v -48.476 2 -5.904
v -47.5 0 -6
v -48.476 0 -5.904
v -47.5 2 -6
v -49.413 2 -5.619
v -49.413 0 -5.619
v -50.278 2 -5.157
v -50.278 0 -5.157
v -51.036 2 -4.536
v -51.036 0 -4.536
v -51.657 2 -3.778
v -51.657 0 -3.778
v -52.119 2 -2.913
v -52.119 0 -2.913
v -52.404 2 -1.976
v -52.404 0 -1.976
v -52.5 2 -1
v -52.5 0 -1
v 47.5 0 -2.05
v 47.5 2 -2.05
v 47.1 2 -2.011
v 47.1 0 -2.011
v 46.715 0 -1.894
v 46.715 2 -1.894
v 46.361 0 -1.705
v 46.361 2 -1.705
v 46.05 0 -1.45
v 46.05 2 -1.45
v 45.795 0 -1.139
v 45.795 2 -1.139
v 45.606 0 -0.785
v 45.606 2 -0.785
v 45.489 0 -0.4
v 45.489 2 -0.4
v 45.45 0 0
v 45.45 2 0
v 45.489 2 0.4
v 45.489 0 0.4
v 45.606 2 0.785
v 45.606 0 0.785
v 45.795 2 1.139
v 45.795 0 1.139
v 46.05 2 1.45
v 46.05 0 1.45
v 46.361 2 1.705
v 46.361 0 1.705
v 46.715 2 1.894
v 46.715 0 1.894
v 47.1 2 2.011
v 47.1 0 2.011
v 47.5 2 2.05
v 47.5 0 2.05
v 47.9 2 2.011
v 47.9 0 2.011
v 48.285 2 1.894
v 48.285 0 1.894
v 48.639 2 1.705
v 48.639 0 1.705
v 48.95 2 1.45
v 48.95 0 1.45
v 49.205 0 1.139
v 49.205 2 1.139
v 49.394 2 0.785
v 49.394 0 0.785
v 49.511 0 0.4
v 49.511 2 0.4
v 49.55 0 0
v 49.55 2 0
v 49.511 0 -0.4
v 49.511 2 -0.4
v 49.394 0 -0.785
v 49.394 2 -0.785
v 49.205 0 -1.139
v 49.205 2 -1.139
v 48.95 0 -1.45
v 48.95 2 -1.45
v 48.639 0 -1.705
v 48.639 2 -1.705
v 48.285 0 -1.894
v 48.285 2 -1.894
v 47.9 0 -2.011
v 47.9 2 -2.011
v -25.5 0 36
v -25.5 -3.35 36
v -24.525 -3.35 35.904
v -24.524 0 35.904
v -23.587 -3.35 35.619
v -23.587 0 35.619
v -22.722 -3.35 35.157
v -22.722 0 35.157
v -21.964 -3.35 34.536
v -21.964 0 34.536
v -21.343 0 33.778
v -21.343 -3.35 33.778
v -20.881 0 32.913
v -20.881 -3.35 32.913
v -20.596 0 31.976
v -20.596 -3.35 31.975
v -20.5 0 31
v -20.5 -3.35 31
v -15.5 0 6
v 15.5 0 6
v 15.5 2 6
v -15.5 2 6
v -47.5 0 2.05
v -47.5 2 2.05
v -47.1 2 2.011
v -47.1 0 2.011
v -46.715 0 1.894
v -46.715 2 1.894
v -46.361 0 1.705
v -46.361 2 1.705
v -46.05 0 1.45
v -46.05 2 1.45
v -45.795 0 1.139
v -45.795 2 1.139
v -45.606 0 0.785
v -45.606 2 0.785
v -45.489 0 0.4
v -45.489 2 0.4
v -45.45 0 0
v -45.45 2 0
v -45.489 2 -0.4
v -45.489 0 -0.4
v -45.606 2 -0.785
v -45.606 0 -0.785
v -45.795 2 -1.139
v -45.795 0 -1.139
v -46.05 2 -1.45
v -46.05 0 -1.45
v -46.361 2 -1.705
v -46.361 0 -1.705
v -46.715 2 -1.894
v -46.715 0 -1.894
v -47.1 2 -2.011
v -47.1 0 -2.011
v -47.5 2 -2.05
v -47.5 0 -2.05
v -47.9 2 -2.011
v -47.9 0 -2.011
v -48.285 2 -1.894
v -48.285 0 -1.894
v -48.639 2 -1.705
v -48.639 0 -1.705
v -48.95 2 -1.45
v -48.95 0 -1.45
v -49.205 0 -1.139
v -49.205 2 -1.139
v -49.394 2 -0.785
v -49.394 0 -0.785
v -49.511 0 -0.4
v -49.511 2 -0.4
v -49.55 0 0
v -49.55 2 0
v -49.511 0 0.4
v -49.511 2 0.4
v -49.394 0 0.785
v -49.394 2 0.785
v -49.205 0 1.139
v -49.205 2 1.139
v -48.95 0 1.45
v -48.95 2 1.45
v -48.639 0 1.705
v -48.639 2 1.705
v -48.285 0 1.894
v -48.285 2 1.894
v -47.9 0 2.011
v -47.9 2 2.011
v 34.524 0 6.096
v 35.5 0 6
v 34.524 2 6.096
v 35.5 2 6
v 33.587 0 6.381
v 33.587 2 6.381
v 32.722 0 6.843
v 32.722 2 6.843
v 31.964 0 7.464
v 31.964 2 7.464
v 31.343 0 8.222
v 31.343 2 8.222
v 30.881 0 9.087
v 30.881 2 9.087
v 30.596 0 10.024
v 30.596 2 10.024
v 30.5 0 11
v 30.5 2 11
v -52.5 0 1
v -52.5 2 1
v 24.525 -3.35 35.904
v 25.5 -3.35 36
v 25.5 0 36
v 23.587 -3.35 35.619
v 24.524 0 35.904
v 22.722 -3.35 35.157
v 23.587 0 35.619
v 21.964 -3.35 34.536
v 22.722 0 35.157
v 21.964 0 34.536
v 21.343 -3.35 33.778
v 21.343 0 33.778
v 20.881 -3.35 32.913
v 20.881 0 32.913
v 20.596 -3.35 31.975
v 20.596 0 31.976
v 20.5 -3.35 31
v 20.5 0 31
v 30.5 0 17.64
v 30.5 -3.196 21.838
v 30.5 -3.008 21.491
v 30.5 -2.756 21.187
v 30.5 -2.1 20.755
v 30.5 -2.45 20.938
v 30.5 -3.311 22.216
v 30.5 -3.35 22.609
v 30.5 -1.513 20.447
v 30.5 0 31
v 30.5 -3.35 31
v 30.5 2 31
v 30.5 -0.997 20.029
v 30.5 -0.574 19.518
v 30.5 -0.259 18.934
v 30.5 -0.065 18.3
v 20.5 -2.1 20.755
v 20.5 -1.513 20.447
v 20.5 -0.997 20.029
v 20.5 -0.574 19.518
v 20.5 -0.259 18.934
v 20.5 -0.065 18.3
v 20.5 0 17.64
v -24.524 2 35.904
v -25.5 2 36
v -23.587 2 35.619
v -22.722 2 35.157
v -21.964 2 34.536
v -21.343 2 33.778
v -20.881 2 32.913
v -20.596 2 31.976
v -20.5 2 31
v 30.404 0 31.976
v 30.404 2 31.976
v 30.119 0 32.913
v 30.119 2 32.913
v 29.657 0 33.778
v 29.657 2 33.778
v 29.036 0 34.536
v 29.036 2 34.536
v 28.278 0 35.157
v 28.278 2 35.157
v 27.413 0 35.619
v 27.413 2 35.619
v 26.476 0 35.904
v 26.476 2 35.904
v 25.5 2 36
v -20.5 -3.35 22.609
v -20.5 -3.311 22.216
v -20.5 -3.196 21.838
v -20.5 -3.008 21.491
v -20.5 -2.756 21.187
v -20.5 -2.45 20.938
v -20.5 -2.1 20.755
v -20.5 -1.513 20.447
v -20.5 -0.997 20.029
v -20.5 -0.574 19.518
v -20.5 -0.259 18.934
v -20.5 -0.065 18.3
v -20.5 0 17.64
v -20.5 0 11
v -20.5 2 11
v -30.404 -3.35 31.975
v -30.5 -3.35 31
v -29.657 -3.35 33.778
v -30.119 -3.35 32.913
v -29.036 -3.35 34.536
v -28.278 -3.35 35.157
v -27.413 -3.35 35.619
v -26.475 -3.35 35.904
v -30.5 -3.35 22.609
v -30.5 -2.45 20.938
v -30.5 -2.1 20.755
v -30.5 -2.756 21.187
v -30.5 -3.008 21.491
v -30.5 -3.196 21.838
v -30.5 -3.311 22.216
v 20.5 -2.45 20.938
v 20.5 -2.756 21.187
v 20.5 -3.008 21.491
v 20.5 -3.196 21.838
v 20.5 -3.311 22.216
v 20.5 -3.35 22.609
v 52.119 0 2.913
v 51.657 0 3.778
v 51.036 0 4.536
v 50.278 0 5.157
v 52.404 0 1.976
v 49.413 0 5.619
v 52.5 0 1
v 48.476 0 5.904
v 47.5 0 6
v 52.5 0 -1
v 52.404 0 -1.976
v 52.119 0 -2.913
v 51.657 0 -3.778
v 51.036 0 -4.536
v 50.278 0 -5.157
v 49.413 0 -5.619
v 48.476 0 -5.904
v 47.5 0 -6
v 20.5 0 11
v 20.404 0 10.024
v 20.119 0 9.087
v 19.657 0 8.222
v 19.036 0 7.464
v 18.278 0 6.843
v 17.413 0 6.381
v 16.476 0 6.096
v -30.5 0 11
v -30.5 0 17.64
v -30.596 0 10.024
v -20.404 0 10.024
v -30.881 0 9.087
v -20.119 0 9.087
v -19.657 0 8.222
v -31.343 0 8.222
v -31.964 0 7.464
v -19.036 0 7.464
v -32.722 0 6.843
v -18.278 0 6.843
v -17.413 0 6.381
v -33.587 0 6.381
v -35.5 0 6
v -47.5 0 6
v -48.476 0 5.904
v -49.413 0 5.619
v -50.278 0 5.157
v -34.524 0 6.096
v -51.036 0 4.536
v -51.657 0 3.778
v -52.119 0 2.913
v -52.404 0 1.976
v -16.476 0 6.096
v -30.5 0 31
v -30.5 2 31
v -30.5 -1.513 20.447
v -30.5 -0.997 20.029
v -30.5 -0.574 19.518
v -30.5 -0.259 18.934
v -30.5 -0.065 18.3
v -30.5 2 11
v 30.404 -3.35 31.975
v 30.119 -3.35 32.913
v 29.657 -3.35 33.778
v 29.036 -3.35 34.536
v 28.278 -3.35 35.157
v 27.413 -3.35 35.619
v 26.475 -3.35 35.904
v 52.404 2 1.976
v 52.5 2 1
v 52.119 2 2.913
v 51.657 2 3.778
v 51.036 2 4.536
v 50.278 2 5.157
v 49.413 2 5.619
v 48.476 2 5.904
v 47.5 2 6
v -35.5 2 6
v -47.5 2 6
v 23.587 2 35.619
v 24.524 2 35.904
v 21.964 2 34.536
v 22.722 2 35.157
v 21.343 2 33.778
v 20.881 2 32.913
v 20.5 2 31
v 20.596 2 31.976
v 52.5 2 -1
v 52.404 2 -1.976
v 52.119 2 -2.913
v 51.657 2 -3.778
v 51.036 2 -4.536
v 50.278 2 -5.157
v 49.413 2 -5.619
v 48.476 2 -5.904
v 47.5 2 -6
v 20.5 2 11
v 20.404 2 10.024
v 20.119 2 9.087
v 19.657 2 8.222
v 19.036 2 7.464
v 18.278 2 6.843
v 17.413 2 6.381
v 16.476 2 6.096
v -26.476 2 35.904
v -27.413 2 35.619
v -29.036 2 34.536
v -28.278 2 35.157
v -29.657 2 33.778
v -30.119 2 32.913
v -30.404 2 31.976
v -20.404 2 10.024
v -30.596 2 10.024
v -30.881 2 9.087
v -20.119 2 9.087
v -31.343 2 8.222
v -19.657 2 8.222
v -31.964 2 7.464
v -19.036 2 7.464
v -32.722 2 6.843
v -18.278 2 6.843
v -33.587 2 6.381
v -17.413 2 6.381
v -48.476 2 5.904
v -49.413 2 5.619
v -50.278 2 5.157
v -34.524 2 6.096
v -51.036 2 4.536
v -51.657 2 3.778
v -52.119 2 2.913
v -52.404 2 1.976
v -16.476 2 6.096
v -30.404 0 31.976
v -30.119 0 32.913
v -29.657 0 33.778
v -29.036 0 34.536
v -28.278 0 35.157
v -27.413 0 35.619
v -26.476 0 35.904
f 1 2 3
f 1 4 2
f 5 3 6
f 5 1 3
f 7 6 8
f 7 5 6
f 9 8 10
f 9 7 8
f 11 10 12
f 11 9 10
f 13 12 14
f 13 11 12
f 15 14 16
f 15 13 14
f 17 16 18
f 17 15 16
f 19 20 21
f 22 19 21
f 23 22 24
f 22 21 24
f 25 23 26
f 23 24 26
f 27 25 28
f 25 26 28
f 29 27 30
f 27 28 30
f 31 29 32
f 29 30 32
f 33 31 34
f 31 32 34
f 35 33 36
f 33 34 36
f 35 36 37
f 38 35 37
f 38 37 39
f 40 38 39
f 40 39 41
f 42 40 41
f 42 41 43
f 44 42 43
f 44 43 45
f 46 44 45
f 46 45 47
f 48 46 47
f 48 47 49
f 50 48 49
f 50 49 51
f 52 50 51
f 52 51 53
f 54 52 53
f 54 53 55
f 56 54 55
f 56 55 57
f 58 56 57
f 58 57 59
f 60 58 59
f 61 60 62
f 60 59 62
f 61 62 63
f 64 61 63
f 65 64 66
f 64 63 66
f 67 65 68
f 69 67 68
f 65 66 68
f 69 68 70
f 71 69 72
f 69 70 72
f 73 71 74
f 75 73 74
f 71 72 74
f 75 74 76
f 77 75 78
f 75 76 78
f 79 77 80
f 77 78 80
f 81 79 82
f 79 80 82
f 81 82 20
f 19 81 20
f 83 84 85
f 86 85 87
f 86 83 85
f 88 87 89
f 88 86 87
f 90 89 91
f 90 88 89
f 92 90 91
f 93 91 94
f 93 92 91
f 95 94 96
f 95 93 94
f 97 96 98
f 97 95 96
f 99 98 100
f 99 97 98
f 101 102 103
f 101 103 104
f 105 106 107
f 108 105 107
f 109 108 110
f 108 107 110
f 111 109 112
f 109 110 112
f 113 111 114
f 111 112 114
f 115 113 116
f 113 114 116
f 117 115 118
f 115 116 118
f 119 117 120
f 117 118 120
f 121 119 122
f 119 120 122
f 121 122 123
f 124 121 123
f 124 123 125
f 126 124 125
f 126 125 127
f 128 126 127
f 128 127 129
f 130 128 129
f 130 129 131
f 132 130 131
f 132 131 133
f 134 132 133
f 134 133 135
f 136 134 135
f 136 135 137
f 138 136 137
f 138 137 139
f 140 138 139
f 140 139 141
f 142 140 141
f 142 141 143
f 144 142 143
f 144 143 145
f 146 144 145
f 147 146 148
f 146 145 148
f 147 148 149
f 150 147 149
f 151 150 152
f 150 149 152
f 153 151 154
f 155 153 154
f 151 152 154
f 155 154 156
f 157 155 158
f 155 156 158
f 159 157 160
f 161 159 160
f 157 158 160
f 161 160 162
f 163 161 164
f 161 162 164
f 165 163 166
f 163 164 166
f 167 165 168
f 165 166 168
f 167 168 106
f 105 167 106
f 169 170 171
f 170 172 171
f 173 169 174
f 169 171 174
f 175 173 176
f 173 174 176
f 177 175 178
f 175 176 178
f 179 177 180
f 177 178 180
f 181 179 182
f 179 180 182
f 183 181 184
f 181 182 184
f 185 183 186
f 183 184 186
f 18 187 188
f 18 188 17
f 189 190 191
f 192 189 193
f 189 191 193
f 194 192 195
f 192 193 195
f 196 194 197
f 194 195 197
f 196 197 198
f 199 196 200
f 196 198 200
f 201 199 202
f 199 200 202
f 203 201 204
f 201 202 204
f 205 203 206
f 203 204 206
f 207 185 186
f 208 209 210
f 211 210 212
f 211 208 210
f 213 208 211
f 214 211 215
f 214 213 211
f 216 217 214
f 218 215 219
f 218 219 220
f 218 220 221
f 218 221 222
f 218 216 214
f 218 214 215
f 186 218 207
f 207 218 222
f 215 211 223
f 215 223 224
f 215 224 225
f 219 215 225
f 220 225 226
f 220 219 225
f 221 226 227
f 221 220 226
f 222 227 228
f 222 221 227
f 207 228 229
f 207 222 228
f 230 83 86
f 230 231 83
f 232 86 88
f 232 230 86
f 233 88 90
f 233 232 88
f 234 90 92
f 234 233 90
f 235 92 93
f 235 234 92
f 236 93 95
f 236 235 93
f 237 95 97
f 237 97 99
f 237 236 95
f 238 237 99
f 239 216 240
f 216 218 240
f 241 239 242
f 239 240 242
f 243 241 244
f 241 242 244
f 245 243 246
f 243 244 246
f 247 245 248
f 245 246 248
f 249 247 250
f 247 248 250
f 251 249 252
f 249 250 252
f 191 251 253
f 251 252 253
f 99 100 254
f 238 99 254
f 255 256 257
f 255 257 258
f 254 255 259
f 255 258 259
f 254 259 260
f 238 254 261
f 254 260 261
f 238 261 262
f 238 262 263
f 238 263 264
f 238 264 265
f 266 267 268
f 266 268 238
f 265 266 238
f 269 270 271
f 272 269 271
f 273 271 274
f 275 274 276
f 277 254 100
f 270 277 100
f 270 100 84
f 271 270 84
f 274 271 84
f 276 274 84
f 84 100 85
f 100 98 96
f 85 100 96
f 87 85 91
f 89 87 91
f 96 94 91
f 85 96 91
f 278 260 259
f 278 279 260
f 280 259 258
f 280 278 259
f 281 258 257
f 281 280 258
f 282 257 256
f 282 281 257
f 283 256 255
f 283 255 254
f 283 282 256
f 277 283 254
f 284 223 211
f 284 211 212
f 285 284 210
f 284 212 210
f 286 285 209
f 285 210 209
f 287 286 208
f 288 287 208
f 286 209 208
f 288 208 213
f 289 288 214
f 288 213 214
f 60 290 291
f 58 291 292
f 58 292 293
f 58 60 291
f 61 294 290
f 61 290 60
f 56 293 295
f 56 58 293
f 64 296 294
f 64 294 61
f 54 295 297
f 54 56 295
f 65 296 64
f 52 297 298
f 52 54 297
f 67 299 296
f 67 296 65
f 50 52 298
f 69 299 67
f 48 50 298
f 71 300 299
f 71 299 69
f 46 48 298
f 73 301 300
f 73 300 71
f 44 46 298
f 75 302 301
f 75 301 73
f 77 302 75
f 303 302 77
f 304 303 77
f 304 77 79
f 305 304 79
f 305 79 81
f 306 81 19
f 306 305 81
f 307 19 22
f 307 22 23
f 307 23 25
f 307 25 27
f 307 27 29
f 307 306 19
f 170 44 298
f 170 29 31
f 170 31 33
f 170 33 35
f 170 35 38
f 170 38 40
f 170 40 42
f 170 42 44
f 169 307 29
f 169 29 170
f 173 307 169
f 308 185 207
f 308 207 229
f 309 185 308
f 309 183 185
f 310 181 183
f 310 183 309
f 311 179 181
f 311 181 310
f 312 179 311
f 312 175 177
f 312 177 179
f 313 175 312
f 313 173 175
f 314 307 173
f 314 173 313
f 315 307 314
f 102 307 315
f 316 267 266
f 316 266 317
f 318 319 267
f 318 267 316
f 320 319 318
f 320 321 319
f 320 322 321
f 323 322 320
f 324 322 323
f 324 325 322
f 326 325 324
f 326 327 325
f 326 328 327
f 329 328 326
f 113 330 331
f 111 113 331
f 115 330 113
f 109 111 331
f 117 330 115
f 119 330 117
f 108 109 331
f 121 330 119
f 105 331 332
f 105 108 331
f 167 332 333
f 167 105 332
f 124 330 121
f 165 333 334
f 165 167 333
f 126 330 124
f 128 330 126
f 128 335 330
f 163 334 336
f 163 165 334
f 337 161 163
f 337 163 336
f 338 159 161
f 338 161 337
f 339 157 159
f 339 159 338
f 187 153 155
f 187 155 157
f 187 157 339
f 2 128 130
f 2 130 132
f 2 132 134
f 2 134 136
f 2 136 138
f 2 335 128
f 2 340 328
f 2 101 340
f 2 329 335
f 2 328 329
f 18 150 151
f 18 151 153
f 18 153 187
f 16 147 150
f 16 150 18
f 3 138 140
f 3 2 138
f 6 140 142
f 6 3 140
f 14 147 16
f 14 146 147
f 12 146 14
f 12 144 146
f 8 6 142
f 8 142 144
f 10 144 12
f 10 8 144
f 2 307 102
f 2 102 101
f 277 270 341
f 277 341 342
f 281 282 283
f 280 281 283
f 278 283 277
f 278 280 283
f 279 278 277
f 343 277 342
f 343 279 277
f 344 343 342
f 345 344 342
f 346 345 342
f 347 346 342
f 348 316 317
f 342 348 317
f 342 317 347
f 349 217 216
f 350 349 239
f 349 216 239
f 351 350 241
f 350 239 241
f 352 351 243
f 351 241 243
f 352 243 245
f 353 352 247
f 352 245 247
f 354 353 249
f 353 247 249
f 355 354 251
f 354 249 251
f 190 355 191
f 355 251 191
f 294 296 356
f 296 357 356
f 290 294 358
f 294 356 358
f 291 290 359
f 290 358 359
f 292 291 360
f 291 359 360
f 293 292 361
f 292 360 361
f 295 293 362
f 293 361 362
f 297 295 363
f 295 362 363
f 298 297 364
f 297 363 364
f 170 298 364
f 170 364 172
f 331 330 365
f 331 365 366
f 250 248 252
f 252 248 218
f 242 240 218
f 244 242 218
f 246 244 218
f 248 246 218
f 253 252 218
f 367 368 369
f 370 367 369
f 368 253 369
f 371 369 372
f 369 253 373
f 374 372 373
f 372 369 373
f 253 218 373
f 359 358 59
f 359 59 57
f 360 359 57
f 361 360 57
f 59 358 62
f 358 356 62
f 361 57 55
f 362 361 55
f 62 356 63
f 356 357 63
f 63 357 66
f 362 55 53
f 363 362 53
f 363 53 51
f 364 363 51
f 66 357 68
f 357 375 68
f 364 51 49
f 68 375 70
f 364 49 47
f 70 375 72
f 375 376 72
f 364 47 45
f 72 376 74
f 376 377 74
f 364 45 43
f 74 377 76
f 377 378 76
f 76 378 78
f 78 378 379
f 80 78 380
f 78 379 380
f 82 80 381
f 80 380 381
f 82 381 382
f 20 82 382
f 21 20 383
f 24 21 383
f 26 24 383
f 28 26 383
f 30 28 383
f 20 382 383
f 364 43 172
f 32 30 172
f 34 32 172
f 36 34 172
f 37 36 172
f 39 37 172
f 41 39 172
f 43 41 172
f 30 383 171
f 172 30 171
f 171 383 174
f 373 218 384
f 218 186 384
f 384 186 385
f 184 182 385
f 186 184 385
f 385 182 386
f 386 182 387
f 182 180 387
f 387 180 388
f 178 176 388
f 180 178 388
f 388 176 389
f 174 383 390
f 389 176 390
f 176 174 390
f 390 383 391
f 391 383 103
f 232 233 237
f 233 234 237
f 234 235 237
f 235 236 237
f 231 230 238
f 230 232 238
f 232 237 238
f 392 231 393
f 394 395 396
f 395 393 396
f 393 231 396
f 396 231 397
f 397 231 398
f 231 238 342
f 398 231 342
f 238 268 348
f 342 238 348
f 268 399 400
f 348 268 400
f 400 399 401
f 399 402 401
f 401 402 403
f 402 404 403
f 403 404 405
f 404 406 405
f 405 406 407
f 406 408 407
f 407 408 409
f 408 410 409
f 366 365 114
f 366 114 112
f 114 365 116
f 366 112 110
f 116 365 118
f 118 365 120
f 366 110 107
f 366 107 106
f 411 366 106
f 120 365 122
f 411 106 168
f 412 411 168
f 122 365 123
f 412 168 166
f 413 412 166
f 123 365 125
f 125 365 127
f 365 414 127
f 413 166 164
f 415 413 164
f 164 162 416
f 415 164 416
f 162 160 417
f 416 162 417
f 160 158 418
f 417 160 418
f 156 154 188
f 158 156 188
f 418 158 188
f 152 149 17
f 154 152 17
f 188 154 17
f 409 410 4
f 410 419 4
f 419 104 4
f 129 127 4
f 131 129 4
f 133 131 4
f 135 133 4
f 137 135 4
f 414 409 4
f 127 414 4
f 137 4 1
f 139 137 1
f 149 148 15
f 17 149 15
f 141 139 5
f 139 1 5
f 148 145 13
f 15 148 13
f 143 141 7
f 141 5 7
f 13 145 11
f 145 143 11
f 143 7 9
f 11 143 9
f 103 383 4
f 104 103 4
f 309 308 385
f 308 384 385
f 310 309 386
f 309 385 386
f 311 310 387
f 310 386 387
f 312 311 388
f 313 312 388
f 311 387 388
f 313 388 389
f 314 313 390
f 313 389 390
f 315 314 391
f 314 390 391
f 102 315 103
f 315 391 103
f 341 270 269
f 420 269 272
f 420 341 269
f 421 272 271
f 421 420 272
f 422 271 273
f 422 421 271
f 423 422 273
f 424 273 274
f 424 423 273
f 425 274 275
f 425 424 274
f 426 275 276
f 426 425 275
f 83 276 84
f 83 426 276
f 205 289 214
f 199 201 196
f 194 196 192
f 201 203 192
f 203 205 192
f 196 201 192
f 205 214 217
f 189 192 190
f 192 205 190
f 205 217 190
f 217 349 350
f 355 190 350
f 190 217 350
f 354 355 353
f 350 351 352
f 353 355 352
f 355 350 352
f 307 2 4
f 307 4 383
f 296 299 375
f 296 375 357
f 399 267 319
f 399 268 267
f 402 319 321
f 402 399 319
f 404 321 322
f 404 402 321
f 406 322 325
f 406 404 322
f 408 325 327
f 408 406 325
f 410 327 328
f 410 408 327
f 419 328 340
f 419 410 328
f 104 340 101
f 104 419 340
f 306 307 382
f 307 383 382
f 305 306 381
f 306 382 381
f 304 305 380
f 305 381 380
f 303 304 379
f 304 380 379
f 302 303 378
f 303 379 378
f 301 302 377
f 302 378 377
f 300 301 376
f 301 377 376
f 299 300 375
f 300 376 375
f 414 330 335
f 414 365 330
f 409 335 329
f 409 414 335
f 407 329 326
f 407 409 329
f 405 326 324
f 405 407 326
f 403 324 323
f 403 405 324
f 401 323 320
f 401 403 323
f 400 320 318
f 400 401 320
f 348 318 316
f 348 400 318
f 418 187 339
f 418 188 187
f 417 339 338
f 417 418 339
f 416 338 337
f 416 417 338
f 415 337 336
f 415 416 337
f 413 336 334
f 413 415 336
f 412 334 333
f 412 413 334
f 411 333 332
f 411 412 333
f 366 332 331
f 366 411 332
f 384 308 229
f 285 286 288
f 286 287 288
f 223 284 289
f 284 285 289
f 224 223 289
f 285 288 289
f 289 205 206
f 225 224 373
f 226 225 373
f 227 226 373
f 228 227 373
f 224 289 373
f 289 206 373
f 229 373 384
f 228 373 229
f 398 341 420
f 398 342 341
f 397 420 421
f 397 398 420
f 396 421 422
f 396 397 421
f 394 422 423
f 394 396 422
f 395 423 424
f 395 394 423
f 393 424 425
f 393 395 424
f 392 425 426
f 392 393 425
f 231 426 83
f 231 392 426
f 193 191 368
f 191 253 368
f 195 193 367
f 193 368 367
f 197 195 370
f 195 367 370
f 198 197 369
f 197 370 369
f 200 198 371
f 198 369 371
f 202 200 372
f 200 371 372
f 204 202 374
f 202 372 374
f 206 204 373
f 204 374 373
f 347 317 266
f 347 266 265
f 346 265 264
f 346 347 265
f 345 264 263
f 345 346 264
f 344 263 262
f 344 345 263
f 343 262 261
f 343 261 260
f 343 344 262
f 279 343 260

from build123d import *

# Parameters (mm, degrees)
BOSS_EXTRUDE1_DEPTH  = 2
SKETCH3_R            = 2.05
CUT_EXTRUDE1_DEPTH   = 64.688696014
FILLET1_R            = 5
BOSS_EXTRUDE2_DEPTH  = 5.35
FILLET2_R            = 3.36
FILLET3_R            = 2
FILLET2_OF_MIRROR1_R = 3.36
FILLET3_OF_MIRROR1_R = 2


# Some blends are built 0.0001 mm under size
with BuildPart() as part:
    # Sketch1 → Boss-Extrude1 (new body)
    with BuildSketch(Plane(origin=(0, 0, 0), x_dir=(1, 0, 0), z_dir=(0, 1, 0))):
        Polygon((-52.5, 6), (52.5, 6), (52.5, -6), (30.5, -6), (30.5, -36), (20.5, -36), (20.5, -6), (-20.5, -6), (-20.5, -36), (-30.5, -36), (-30.5, -6), (-52.5, -6), align=None)
    extrude(amount=BOSS_EXTRUDE1_DEPTH)

    # Sketch3 → Cut-Extrude1 (cut, through all)
    with BuildSketch(Plane(origin=(0, 2, 0), x_dir=(1, 0, 0), z_dir=(0, 1, 0))):
        with Locations(Location((-47.5, 0, 0), (0, 0, 270))):
            Circle(SKETCH3_R)
        with Locations(Location((47.5, 0, 0), (0, 0, 90))):
            Circle(SKETCH3_R)
    extrude(amount=-CUT_EXTRUDE1_DEPTH, mode=Mode.SUBTRACT)

    # Fillet1
    fillet1_edges = [part.edges().sort_by_distance(p)[0] for p in [
        (52.5, 1, -6),
        (52.5, 1, 6),
        (20.5, 1, 6),
        (30.5, 1, 6),
        (30.5, 1, 36),
        (20.5, 1, 36),
        (-30.5, 1, 36),
        (-20.5, 1, 36),
        (-20.5, 1, 6),
        (-30.5, 1, 6),
        (-52.5, 1, -6),
        (-52.5, 1, 6),
    ]]
    fillet(fillet1_edges, radius=FILLET1_R - 0.0001)  # a hair under: the kernel refuses the full size

    # Sketch4 → Boss-Extrude2 (add)
    with BuildSketch(Plane(origin=(0, 2, 0), x_dir=(1, 0, 0), z_dir=(0, 1, 0))):
        with BuildLine():
            Line((-20.5, -31), (-20.5, -21))
            Line((-20.5, -21), (-30.5, -21))
            Line((-30.5, -21), (-30.5, -31))
            ThreePointArc((-30.5, -31), (-29.035533906, -34.535533906), (-25.5, -36))
            ThreePointArc((-25.5, -36), (-21.964466094, -34.535533906), (-20.5, -31))
        make_face()
    boss_extrude2 = extrude(amount=-BOSS_EXTRUDE2_DEPTH)

    # Fillet2
    # the kernel refuses this fillet: 3.36 mm, written as the material it adds along each edge
    with BuildSketch(Plane(origin=(-30.5, 0, 21), x_dir=(0, -1, 0), z_dir=(1, 0, 0))) as fillet2_piece_1_section:
        with BuildLine():
            CenterArc((FILLET2_R, FILLET2_R), FILLET2_R, 180, 90)
            Line((0, FILLET2_R), (0, 0))
            Line((0, 0), (FILLET2_R, 0))
        make_face()
    fillet2_piece_1 = extrude(amount=10, mode=Mode.PRIVATE)
    fillet2_piece_1 = split(fillet2_piece_1, bisect_by=Plane(origin=(-25.5, -3.35, 20.239126953), z_dir=(0, 1, 0)), keep=Keep.TOP, mode=Mode.PRIVATE)
    add(fillet2_piece_1)

    # Fillet3
    fillet3_edges = [part.edges().sort_by_distance(p)[0] for p in [
        (-25.5, -3.35, 20.999985119),
    ]]
    fillet(fillet3_edges, radius=FILLET3_R)

    # Mirror1: Boss-Extrude2 across plane
    add(boss_extrude2.mirror(Plane(origin=(0, 0, 0), x_dir=(0, 0, 1), z_dir=(1, 0, 0))))

    # Fillet2 of Mirror1
    # the kernel refuses this fillet: 3.36 mm, written as the material it adds along each edge
    with BuildSketch(Plane(origin=(30.5, 0, 21), x_dir=(0, -1, 0), z_dir=(-1, 0, 0))) as fillet2_of_mirror1_piece_1_section:
        with BuildLine():
            CenterArc((FILLET2_OF_MIRROR1_R, -FILLET2_OF_MIRROR1_R), FILLET2_OF_MIRROR1_R, 90, 90)
            Line((0, -FILLET2_OF_MIRROR1_R), (0, 0))
            Line((0, 0), (FILLET2_OF_MIRROR1_R, 0))
        make_face()
    fillet2_of_mirror1_piece_1 = extrude(amount=10, mode=Mode.PRIVATE)
    fillet2_of_mirror1_piece_1 = split(fillet2_of_mirror1_piece_1, bisect_by=Plane(origin=(25.5, -3.35, 20.239126953), z_dir=(0, 1, 0)), keep=Keep.TOP, mode=Mode.PRIVATE)
    add(fillet2_of_mirror1_piece_1)

    # Fillet3 of Mirror1
    fillet3_of_mirror1_edges = [part.edges().sort_by_distance(p)[0] for p in [
        (25.5, -3.35, 20.999985119),
    ]]
    fillet(fillet3_of_mirror1_edges, radius=FILLET3_OF_MIRROR1_R)


solid = part.part
